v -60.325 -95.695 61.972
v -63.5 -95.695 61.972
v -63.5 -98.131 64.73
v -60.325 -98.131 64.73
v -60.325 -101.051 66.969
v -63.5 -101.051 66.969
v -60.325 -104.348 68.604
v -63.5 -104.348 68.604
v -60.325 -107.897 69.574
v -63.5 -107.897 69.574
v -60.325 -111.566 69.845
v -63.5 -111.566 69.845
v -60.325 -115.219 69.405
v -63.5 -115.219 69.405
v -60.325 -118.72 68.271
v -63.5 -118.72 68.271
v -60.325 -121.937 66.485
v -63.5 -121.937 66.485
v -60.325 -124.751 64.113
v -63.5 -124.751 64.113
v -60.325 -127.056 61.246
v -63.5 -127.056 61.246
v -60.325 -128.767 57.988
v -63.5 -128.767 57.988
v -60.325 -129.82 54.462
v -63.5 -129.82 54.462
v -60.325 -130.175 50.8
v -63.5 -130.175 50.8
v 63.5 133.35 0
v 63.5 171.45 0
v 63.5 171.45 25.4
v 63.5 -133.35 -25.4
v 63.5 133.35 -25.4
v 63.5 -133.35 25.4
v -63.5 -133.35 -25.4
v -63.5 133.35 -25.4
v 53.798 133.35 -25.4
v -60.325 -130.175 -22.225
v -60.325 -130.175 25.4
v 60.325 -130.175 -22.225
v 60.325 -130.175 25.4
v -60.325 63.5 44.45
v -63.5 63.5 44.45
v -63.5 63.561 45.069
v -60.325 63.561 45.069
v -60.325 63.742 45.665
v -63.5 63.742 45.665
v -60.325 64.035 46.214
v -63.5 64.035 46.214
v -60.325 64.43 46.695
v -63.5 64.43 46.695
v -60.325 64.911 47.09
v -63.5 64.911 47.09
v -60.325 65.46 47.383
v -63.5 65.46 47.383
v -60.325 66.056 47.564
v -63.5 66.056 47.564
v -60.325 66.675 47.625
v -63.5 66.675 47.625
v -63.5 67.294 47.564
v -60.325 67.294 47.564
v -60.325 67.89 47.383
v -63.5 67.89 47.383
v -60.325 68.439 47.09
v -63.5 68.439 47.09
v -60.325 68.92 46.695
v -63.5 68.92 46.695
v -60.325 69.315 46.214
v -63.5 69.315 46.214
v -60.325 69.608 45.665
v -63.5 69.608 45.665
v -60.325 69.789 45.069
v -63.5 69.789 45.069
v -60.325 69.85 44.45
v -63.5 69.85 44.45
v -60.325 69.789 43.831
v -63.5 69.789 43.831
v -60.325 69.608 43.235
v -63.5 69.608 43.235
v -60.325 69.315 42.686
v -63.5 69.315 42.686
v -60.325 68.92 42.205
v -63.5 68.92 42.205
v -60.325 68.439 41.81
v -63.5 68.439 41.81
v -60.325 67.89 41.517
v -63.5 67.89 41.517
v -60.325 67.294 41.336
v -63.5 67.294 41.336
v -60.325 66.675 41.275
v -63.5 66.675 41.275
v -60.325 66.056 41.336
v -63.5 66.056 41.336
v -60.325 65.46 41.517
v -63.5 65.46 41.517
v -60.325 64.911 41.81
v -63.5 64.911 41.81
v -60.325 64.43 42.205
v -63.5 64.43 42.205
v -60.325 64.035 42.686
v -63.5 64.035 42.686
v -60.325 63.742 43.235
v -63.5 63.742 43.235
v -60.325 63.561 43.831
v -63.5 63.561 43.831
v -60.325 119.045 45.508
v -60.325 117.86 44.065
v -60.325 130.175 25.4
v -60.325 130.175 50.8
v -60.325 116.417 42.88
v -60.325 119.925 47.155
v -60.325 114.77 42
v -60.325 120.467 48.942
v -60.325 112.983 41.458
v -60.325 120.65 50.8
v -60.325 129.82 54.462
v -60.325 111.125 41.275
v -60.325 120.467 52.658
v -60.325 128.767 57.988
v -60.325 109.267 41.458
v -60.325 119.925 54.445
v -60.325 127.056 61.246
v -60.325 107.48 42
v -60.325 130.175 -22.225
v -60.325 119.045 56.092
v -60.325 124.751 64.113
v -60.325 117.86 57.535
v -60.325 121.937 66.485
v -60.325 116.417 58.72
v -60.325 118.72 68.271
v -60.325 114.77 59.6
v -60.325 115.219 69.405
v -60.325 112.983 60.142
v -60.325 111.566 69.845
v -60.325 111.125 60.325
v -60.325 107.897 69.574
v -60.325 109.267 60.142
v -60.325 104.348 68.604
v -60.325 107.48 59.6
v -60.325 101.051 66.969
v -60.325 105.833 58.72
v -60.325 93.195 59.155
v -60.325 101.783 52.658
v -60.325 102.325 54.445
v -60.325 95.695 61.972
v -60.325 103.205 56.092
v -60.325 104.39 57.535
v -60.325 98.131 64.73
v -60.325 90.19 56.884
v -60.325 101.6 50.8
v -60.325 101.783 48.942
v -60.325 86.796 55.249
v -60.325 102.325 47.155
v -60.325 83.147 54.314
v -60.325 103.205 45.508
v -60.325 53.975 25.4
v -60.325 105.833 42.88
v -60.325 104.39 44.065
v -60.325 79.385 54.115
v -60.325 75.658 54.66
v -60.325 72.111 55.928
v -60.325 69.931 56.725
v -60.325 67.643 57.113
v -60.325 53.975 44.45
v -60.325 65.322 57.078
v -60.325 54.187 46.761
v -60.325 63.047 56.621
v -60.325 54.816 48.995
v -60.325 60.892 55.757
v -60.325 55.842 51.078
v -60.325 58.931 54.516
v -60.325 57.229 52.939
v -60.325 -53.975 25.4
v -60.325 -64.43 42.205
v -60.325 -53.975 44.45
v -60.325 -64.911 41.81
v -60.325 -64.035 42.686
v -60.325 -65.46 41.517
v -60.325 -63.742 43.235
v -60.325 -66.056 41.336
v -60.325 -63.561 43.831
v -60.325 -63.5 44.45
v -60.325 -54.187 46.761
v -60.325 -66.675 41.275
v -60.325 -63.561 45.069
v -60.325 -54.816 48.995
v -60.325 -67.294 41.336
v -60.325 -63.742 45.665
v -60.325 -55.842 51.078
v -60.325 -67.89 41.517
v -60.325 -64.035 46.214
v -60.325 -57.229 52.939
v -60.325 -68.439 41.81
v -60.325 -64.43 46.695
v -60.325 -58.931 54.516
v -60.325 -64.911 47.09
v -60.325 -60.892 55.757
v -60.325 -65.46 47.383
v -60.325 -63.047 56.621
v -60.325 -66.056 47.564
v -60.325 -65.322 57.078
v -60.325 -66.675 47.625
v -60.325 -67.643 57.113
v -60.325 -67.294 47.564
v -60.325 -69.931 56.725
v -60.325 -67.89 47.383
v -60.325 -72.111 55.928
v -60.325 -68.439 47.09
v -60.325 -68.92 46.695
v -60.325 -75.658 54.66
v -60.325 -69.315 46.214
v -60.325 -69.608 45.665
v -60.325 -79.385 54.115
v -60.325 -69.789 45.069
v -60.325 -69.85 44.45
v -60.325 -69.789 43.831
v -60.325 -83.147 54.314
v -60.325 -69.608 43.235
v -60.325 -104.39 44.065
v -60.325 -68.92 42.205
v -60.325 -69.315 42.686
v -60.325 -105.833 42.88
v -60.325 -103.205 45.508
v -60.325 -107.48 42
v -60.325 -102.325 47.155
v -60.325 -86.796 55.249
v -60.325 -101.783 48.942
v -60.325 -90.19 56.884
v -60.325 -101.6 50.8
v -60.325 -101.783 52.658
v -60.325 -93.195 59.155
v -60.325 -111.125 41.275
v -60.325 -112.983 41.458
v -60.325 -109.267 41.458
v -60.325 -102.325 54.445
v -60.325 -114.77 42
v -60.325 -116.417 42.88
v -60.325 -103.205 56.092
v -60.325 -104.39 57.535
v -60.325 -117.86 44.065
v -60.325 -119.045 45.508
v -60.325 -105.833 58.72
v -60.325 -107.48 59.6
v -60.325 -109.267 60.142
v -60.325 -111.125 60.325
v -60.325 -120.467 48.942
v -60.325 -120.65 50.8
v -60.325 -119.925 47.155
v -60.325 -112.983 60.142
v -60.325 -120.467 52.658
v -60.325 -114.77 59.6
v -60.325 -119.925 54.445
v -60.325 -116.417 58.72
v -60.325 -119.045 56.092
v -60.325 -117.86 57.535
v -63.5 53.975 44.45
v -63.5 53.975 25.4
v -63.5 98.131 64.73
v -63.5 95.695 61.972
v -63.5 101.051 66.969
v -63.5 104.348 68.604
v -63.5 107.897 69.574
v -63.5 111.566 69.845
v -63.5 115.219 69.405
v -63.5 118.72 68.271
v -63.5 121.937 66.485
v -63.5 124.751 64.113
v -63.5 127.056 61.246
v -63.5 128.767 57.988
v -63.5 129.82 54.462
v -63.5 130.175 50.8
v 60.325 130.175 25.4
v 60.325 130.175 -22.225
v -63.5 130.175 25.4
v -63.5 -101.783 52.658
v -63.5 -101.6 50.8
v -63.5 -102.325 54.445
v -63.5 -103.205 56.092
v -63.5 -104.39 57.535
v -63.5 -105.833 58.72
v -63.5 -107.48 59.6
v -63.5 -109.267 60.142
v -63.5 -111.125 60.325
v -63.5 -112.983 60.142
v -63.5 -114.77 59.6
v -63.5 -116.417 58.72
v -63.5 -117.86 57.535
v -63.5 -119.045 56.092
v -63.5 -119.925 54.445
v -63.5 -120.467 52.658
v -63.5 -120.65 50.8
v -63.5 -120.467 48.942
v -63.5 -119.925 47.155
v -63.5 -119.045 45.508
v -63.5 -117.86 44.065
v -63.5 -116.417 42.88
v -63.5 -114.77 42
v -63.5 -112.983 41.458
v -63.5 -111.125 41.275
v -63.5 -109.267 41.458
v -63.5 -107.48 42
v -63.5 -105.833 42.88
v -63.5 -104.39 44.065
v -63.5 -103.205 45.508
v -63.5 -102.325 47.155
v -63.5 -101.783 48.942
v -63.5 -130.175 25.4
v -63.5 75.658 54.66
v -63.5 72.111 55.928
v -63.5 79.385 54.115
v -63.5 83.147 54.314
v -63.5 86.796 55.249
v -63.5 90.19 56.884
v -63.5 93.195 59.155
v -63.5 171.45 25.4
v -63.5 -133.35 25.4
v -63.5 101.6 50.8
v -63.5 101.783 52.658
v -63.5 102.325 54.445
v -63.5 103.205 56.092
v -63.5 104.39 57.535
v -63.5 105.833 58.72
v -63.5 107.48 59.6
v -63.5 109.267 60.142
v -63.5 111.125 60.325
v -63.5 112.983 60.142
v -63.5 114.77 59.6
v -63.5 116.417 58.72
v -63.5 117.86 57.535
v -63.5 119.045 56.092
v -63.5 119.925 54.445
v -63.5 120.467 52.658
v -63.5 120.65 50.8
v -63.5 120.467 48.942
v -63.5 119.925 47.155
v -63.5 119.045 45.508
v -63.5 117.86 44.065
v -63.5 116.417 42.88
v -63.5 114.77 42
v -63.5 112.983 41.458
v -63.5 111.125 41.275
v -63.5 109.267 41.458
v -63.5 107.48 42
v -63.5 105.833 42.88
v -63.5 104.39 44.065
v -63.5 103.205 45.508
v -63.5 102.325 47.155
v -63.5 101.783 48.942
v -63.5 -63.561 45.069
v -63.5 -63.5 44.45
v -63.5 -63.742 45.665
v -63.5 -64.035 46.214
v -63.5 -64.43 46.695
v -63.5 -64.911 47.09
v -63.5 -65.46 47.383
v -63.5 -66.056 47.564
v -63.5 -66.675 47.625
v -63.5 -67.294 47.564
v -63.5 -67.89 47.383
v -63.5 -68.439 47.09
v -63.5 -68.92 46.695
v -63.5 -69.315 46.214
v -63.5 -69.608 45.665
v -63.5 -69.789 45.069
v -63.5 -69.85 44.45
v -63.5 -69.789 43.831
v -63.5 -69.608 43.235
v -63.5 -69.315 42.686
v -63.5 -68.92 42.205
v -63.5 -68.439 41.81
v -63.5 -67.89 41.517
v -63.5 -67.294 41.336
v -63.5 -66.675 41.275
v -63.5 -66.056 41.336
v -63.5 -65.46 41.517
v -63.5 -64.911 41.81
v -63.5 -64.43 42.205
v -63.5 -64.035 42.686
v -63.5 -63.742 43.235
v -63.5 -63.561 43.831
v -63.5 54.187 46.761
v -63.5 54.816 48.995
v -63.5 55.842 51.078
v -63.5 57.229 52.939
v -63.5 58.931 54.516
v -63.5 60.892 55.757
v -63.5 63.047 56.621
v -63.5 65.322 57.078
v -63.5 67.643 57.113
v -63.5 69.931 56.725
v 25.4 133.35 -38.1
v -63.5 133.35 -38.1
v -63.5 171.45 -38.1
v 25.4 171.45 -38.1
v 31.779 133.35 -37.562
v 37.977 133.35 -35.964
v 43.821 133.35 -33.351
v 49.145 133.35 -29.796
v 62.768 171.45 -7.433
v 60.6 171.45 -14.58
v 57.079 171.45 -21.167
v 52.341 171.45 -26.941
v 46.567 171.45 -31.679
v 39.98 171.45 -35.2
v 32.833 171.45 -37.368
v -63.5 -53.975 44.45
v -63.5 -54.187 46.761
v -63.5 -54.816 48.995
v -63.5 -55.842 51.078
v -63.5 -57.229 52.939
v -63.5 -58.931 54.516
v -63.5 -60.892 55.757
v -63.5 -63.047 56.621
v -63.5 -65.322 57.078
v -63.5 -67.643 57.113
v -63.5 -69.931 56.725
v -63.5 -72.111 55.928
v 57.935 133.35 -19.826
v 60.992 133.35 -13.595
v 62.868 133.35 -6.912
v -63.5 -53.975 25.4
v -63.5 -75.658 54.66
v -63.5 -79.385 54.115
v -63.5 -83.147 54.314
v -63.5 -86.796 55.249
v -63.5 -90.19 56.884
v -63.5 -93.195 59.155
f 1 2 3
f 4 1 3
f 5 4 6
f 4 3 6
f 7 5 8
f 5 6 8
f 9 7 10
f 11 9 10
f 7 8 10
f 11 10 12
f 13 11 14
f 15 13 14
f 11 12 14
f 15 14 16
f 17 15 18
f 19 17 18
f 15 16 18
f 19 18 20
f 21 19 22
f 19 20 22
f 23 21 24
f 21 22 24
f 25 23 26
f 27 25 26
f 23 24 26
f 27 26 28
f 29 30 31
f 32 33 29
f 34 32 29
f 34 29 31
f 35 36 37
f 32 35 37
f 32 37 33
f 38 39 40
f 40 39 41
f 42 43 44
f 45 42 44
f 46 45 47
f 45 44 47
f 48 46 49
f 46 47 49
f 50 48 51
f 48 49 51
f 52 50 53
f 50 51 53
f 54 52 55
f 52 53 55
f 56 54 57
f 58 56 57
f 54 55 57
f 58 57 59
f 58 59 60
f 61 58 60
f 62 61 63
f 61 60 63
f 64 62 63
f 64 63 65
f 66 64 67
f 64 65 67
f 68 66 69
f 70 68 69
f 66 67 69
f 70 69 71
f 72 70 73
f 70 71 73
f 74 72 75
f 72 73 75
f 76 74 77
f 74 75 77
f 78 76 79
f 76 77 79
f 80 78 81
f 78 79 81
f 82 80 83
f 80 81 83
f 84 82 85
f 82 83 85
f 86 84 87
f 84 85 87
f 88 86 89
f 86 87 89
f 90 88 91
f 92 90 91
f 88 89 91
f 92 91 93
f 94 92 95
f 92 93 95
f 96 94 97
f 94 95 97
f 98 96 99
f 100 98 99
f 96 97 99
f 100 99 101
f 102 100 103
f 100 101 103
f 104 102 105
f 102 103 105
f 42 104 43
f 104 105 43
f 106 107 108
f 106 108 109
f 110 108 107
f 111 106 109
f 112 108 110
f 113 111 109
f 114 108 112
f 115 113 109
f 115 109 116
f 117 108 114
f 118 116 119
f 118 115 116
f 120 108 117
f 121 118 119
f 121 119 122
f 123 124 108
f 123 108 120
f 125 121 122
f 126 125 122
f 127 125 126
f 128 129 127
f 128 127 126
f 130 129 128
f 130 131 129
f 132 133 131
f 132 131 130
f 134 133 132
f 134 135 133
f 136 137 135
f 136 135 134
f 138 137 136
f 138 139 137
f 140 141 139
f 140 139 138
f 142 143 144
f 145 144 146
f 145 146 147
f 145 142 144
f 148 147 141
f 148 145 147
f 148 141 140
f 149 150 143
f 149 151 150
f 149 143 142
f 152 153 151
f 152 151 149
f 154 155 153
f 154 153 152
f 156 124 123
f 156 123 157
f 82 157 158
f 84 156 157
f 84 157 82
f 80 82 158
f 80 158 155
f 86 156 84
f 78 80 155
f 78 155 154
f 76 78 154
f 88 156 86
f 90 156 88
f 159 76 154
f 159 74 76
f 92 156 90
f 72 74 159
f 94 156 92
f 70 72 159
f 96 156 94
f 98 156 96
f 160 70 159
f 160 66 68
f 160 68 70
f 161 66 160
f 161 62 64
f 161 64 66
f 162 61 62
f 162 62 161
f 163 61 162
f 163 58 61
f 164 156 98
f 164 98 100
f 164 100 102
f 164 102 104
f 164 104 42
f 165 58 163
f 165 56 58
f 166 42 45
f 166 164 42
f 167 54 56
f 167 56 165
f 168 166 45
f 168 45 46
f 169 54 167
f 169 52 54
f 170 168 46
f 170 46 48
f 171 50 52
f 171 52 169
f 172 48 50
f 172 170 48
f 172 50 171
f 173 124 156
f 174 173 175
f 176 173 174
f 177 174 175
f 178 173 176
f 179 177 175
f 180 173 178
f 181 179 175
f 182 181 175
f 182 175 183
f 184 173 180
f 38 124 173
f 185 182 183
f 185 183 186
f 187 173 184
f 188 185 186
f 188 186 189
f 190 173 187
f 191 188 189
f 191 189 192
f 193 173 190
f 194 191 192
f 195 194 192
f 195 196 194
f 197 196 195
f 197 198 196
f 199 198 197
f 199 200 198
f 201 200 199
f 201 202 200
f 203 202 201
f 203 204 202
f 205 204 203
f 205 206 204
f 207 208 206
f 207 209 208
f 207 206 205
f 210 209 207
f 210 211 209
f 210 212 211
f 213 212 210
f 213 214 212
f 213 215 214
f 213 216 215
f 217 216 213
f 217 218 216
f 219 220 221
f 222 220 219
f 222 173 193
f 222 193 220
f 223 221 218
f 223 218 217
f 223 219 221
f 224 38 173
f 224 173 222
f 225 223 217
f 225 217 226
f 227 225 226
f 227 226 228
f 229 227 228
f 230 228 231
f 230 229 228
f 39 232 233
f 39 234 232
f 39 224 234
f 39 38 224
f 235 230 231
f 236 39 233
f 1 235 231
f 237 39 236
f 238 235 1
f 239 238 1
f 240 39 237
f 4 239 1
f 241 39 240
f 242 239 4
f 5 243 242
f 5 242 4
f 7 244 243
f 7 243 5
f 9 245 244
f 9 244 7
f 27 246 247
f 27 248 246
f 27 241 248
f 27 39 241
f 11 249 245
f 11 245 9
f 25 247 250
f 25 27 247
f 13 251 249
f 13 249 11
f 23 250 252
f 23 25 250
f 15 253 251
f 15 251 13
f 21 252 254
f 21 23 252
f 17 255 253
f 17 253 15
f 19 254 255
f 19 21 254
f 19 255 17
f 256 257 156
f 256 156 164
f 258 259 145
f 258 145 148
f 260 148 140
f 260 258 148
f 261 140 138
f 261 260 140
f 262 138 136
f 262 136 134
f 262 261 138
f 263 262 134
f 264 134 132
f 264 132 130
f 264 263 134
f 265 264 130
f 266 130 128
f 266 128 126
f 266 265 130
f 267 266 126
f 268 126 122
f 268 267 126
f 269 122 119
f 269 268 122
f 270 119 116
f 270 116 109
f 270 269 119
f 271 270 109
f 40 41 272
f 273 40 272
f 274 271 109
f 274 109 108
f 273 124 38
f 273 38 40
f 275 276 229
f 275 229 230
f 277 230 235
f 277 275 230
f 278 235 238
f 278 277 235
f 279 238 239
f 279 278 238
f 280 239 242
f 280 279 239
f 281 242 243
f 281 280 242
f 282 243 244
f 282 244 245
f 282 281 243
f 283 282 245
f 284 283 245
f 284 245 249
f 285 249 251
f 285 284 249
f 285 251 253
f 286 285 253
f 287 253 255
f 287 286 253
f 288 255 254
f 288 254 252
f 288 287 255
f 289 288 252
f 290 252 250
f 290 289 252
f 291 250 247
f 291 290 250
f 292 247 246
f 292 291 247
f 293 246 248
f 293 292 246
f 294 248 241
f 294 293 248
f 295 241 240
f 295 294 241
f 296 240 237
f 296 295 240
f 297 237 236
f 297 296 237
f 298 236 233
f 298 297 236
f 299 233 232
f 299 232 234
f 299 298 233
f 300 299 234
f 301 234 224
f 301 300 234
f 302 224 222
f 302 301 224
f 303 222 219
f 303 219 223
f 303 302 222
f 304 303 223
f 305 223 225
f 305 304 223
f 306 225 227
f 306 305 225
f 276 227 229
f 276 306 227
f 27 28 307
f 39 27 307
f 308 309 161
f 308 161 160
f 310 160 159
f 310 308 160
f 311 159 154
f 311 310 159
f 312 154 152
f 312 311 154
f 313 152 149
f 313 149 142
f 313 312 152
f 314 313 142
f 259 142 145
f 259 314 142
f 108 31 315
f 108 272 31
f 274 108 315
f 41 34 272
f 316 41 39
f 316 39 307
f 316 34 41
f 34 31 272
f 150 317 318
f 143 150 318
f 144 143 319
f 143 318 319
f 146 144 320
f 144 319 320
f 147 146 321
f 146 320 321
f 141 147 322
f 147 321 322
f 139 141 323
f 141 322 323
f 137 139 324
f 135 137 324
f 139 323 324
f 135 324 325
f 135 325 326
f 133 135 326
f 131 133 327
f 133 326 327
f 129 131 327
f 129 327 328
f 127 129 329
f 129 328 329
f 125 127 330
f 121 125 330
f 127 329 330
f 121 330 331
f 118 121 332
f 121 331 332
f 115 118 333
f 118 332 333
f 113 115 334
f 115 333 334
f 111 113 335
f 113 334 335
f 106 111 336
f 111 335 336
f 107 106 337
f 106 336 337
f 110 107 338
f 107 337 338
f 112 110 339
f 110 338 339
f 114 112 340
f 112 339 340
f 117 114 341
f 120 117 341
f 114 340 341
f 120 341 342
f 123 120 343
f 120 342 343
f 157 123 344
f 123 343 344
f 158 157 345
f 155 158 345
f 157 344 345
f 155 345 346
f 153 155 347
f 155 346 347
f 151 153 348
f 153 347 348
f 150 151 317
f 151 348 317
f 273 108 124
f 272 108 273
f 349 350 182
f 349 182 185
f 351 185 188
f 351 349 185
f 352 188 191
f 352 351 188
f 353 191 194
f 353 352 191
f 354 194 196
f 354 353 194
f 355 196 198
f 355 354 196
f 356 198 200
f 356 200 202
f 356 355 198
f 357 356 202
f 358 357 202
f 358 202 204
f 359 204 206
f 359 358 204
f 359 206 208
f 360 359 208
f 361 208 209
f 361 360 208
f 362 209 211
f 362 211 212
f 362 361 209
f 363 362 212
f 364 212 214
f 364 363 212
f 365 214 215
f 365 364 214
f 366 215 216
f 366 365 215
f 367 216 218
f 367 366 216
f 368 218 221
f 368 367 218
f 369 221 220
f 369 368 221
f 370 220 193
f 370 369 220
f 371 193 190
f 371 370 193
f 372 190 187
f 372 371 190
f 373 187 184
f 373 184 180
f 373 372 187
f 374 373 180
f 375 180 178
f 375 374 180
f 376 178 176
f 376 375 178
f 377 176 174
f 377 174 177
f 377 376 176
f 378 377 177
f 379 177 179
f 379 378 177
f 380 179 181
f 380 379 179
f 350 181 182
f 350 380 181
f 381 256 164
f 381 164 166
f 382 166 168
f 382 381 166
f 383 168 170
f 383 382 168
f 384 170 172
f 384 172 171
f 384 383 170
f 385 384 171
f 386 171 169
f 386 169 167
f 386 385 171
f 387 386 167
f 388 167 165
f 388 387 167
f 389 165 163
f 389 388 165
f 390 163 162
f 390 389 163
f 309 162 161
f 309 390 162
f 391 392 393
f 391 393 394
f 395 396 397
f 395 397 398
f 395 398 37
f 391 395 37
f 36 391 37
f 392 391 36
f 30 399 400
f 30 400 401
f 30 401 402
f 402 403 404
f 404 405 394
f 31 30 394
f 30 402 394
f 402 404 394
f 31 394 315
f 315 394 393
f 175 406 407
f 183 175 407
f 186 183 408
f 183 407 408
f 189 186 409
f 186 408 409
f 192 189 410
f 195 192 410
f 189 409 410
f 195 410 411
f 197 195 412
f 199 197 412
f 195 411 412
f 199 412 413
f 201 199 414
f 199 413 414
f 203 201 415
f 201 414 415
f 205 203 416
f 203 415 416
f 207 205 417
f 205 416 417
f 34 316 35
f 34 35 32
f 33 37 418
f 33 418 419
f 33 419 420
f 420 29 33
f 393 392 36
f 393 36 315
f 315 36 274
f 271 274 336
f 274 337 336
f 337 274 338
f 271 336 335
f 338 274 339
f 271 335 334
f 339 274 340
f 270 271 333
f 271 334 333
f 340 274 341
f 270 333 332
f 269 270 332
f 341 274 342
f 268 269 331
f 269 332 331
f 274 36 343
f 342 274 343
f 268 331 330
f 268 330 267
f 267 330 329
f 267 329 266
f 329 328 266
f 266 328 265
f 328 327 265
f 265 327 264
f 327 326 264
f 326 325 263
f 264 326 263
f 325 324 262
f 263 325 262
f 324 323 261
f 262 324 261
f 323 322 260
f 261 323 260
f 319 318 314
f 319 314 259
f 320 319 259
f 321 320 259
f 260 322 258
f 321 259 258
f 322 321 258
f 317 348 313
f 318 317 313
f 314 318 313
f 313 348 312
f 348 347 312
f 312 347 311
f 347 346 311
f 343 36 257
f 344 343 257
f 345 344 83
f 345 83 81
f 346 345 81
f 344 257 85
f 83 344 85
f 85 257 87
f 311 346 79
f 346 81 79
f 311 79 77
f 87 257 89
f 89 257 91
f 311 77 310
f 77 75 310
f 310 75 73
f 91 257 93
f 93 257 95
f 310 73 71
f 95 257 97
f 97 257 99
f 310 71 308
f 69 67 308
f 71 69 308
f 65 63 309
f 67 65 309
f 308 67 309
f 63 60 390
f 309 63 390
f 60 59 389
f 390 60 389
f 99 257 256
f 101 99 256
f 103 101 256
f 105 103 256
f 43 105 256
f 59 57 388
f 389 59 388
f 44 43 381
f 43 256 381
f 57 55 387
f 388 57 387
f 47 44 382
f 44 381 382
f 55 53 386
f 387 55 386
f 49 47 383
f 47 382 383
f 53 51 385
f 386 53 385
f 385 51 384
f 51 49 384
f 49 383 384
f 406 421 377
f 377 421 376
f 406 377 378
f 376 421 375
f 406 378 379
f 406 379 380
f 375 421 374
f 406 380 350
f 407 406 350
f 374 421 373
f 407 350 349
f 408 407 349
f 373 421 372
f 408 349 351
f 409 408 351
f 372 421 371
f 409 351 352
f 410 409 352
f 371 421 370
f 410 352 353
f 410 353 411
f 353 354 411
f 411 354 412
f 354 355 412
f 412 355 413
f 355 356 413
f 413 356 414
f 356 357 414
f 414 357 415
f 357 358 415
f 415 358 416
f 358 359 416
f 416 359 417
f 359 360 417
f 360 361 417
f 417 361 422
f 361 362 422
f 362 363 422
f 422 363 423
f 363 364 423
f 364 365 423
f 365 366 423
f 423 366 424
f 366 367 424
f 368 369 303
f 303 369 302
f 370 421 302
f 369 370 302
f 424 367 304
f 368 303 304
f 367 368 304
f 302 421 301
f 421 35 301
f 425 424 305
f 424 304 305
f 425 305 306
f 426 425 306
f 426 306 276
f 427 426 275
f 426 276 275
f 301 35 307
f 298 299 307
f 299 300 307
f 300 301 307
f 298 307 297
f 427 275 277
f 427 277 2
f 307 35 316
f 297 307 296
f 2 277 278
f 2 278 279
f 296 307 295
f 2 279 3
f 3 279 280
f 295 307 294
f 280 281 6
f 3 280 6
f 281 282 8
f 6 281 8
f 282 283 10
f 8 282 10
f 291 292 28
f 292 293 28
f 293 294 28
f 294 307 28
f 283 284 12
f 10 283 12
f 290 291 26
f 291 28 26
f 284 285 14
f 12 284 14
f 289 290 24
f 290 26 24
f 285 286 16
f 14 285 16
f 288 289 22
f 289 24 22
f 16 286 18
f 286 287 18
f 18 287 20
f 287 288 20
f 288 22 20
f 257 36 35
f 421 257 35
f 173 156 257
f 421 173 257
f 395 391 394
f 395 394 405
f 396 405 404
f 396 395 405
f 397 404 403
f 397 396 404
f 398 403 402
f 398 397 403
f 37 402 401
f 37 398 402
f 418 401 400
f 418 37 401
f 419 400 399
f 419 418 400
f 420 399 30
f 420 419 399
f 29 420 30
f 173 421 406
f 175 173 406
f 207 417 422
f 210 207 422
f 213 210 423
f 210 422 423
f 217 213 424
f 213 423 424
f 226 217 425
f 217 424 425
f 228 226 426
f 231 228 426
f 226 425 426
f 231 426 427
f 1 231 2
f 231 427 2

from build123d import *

# Parameters (mm, degrees)
SKETCH1_W           = 127
SKETCH1_H           = 266.7
BOSS_EXTRUDE1_DEPTH = 25.4
SHELL1_T            = -3.175
SKETCH2_R           = 9.525
SKETCH2_R_2         = 3.175
BOSS_EXTRUDE2_DEPTH = 3.175
BOSS_EXTRUDE3_DEPTH = 38.1


with BuildPart() as part:
    # Sketch1 → Boss-Extrude1 (new, symmetric)
    with BuildSketch(Plane.XY):
        Rectangle(SKETCH1_W, SKETCH1_H)
    extrude(amount=BOSS_EXTRUDE1_DEPTH, both=True)

    # Shell1
    shell1_openings = [part.faces().sort_by_distance(p)[0] for p in [
        (0, 0, 25.4),
    ]]
    offset(amount=SHELL1_T, openings=shell1_openings, kind=Kind.INTERSECTION)

    # Sketch2 → Boss-Extrude2 (add)
    with BuildSketch(Plane.ZY.offset(63.5)):
        with BuildLine():
            Line((50.8, 130.175), (25.4, 130.175))
            Line((25.4, 130.175), (25.4, 53.975))
            Line((25.4, 53.975), (44.45, 53.975))
            ThreePointArc((44.45, 53.975), (55.181439518, 59.883372369), (55.927786008, 72.11103057))
            ThreePointArc((55.927786008, 72.11103057), (54.690903616, 84.99461885), (61.97223251, 95.695038213))
            ThreePointArc((61.97223251, 95.695038213), (68.922407015, 116.99704087), (50.8, 130.175))
        make_face()
        with Locations(Location((50.8, 111.125, 0), (0, 0, 270))):
            Circle(SKETCH2_R, mode=Mode.SUBTRACT)
        with Locations(Location((44.45, 66.675, 0), (0, 0, 270))):
            Circle(SKETCH2_R_2, mode=Mode.SUBTRACT)
    boss_extrude2 = extrude(amount=-BOSS_EXTRUDE2_DEPTH)

    # Sketch3 → Boss-Extrude3 (add)
    with BuildSketch(Plane(origin=(0, 133.35, 0), x_dir=(1, 0, 0), z_dir=(0, 1, 0))):
        with BuildLine():
            Line((63.5, -25.4), (-63.5, -25.4))
            Line((-63.5, -25.4), (-63.5, 38.1))
            Line((-63.5, 38.1), (25.4, 38.1))
            ThreePointArc((25.4, 38.1), (52.340768363, 26.940768363), (63.5, 0))
            Line((63.5, 0), (63.5, -25.4))
        make_face()
    extrude(amount=BOSS_EXTRUDE3_DEPTH)

    # Mirror1: Boss-Extrude2 across plane
    add(boss_extrude2.mirror(Plane.ZX))


solid = part.part
